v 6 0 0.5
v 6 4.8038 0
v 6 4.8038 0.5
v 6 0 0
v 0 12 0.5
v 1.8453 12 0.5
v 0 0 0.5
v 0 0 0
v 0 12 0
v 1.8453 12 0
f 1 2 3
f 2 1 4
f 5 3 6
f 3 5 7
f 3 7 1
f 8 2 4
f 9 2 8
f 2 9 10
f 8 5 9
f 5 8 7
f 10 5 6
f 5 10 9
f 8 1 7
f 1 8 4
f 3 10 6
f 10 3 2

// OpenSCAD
function side_width() = 1/2;

module side()
{
    color( [1, 1, 1, 1]) //white HDPE
    {  translate([3,6,1/4])
        difference()
        {
            cube(size = [6,12,side_width()], center = true);
            rotate([0,0,30]) translate([8,0,0]) 
                cube(size = [12,12,side_width() + .1], center = true);
            
        }
    }
}
side();
